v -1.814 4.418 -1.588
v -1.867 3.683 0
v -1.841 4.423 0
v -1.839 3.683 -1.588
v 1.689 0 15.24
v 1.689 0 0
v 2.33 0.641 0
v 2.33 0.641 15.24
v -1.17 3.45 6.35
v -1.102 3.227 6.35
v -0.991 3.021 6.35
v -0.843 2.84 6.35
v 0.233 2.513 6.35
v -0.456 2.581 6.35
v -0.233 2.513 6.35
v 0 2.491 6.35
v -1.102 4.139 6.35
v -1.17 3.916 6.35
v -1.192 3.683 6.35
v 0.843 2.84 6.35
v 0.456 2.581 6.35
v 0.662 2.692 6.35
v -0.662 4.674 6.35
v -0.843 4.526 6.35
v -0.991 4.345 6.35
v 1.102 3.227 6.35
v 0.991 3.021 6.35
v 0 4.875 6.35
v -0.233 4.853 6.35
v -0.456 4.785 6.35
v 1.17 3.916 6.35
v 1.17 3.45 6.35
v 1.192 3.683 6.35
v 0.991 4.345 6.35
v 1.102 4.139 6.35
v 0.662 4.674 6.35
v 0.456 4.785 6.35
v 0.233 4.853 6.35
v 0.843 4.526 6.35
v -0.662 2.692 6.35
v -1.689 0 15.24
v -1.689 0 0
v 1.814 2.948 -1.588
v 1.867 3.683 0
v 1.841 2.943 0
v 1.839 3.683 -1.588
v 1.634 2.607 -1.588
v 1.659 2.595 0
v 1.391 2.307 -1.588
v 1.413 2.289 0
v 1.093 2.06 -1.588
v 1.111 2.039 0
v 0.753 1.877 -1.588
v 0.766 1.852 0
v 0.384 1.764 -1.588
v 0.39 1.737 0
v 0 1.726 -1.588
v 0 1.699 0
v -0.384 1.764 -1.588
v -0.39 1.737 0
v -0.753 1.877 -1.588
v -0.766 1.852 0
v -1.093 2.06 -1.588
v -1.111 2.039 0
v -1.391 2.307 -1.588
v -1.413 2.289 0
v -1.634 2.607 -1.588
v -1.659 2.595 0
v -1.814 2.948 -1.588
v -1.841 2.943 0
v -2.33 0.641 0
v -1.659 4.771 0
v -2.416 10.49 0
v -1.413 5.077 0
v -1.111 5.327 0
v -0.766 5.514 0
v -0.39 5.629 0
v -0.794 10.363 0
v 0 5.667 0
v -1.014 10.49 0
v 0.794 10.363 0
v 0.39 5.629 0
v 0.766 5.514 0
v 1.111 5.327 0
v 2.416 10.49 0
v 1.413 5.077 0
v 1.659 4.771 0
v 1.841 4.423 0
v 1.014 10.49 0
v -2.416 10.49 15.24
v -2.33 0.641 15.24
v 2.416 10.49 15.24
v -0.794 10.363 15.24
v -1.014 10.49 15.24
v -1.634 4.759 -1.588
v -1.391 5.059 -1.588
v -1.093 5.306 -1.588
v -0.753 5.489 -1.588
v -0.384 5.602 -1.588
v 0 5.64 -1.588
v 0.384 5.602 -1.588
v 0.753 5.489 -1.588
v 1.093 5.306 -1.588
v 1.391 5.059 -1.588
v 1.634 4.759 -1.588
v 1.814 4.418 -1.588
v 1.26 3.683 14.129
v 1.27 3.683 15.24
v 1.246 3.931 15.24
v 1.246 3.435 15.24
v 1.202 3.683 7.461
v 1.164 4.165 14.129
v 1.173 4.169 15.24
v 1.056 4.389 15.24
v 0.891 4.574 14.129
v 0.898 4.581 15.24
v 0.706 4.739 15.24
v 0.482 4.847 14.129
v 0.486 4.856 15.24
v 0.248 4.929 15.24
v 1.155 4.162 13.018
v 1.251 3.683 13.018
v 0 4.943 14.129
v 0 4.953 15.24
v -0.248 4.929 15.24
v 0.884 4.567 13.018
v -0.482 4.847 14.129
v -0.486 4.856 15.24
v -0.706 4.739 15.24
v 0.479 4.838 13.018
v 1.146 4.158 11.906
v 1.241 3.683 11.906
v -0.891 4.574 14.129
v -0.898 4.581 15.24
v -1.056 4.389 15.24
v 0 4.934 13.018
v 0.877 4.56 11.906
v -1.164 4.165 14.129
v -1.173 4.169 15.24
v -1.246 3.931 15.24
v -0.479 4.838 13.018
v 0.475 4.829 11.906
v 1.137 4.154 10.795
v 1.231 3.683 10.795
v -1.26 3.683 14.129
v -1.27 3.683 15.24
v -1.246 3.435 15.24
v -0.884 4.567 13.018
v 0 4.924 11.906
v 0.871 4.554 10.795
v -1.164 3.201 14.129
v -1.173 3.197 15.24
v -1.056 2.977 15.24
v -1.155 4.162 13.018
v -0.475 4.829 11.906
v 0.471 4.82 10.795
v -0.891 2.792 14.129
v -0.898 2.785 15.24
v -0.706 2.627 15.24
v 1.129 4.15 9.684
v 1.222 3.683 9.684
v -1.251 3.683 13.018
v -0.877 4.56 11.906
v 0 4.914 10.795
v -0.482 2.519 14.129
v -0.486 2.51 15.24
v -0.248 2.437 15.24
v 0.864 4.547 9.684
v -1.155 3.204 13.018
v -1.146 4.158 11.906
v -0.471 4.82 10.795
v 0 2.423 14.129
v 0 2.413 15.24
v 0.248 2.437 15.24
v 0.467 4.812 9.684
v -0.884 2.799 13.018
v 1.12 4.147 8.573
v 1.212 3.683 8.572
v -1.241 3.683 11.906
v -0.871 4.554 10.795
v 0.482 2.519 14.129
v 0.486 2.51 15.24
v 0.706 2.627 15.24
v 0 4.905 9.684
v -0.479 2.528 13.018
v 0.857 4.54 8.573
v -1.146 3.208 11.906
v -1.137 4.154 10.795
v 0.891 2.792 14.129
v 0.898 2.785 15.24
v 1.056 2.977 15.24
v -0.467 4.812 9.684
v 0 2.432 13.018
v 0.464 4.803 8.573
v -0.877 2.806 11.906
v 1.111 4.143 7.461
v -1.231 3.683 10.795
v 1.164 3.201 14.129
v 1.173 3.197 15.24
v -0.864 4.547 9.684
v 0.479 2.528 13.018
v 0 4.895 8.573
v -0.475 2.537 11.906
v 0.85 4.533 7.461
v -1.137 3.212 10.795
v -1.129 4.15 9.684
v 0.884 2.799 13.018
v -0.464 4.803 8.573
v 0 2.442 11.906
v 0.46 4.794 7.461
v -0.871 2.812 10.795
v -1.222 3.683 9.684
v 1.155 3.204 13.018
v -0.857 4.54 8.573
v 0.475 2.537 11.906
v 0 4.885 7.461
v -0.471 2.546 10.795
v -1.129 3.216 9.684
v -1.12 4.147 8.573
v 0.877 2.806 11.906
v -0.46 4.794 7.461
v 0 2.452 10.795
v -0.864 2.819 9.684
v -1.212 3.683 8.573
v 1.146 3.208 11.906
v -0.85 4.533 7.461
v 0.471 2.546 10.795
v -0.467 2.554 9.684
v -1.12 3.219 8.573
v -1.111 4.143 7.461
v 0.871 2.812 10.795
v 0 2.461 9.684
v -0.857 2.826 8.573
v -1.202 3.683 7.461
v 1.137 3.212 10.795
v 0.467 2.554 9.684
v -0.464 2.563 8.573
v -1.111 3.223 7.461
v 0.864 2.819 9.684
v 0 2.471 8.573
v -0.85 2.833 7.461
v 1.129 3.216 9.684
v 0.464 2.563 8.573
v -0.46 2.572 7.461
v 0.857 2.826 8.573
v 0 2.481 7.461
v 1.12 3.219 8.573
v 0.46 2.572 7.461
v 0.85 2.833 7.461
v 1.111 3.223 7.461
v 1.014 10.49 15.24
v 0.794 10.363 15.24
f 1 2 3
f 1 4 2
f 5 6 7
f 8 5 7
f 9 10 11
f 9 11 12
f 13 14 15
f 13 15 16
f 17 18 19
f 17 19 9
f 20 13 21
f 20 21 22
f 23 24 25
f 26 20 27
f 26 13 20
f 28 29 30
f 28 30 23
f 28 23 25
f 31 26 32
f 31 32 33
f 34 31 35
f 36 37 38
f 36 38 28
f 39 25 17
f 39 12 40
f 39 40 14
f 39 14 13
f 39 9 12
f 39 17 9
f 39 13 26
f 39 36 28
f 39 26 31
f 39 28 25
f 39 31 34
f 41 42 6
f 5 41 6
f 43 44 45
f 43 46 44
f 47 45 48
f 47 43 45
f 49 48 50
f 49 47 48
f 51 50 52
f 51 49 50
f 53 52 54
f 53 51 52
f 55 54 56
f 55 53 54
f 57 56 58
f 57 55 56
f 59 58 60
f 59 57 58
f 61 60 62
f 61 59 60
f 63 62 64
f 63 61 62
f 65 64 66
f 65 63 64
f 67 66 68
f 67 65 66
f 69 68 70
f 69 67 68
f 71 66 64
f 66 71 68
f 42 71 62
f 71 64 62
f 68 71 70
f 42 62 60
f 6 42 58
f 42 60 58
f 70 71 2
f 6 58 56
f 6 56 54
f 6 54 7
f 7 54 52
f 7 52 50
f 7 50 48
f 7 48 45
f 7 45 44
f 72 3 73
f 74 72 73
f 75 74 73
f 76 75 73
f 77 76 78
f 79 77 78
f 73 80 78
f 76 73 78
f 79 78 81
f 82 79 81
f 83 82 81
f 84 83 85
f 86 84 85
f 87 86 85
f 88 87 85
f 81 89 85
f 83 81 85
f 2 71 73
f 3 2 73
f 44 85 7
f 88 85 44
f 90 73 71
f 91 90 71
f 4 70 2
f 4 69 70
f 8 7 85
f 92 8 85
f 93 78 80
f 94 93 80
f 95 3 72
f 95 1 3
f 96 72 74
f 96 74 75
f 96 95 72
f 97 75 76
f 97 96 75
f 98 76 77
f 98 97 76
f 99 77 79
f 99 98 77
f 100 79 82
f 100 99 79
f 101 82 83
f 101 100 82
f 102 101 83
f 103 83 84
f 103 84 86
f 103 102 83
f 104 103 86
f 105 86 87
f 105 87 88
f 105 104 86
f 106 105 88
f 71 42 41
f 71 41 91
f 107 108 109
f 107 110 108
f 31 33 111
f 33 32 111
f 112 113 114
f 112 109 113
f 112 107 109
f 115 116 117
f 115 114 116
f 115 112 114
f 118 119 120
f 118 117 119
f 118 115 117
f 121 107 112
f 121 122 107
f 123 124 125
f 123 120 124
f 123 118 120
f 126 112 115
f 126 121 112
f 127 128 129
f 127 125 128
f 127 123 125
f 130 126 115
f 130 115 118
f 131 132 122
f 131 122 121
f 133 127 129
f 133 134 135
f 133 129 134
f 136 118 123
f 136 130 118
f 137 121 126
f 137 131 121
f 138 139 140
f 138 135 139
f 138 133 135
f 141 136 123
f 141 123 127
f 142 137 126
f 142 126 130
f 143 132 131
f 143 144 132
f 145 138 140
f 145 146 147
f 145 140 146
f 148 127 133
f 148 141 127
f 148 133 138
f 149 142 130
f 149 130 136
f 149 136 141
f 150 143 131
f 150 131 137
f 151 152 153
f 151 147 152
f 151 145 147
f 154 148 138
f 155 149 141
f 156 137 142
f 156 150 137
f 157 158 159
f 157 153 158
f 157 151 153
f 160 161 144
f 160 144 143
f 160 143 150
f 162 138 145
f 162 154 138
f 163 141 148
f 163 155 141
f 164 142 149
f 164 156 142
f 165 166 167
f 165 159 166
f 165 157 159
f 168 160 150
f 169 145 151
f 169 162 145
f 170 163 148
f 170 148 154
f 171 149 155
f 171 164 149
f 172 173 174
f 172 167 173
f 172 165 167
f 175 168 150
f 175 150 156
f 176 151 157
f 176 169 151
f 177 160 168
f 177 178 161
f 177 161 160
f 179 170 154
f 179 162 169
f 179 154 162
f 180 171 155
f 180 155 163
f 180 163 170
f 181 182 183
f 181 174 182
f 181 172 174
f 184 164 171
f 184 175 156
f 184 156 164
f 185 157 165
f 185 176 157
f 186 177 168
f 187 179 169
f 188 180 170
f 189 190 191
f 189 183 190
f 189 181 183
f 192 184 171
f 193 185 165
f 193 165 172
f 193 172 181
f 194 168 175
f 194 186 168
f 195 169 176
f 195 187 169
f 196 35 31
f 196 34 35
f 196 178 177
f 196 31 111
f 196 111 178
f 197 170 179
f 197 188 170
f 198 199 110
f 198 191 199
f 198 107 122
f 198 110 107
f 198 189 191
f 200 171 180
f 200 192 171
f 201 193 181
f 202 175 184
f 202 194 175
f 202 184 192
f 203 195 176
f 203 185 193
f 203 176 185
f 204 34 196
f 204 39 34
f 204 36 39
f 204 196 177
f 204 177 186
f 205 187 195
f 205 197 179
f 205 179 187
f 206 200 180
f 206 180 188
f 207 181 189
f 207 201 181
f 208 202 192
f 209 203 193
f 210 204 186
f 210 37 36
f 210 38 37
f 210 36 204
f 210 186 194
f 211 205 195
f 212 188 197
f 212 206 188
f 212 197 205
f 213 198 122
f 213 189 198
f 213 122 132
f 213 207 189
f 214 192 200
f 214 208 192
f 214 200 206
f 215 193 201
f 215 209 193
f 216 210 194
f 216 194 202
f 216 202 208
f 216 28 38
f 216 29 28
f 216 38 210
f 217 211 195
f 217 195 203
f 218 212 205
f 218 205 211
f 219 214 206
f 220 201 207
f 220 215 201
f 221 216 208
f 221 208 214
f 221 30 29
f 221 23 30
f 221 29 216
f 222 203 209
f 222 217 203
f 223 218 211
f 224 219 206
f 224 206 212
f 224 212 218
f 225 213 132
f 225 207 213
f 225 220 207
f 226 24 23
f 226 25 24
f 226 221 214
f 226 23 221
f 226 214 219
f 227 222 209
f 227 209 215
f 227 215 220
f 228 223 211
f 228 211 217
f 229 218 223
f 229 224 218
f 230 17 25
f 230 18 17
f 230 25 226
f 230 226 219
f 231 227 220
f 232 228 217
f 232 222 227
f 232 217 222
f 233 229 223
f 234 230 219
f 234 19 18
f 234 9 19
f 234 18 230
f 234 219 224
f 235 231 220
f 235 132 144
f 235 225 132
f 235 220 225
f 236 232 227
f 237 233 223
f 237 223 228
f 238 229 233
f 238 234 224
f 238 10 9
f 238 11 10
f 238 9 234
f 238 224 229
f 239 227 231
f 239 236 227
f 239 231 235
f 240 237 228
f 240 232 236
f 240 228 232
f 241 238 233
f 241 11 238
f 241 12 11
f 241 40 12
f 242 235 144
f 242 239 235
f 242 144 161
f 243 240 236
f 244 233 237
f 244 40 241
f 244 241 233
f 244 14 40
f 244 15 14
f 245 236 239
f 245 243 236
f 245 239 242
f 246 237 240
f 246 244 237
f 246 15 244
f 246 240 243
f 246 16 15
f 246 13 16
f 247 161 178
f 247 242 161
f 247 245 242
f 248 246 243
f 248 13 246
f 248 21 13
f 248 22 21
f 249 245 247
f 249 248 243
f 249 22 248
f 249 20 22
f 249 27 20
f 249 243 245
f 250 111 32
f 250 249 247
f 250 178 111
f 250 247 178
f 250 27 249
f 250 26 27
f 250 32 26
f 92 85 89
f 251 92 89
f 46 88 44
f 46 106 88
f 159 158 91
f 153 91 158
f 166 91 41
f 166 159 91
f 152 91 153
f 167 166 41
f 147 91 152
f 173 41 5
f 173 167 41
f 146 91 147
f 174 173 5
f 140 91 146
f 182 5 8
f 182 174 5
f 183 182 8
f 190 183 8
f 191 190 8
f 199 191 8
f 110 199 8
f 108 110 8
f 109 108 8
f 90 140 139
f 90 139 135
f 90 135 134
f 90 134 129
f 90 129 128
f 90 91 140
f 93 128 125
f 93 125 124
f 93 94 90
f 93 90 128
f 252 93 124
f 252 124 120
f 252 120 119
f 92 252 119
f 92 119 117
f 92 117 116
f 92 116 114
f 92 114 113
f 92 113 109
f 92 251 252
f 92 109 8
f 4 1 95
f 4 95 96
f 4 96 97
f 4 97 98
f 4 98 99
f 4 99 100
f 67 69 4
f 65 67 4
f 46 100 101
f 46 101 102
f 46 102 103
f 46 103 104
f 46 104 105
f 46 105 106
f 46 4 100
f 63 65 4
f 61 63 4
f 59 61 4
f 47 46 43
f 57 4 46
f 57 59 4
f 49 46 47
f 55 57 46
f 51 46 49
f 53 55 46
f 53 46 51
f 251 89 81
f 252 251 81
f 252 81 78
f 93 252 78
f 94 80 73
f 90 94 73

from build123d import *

# Parameters (mm, degrees)
EXTRUDE1_DEPTH     = 15.24
EXTRUDE2_DEPTH     = 1.5875
EXTRUDE2_TAPER     = 1
SKETCH3_R          = 1.27
EXTRUDE3_DEPTH     = 8.89
EXTRUDE3_TAPER     = 0.5
EXTRUDE4_DEPTH     = 16.2400001
CUT_EXTRUDE1_DEPTH = 16.2400001


with BuildPart() as part:
    # Sketch1 → Extrude1 (new body)
    with BuildSketch(Plane.XY):
        Polygon((-2.3241, 0), (2.3241, 0), (2.415646588, 10.4902), (-2.415646588, 10.4902), align=None)
    extrude(amount=EXTRUDE1_DEPTH)

    # Sketch2 → Extrude2 (add)
    with BuildSketch(Plane(origin=(0, 0, 0), x_dir=(-1, 0, 0), z_dir=(0, 0, -1))):
        with BuildLine():
            Line((-1.841041911, 4.423478779), (-1.8669, 3.683))
            Line((-1.8669, 3.683), (-1.841041911, 2.942521221))
            ThreePointArc((-1.841041911, 2.942521221), (0, 1.698625), (1.841041911, 2.942521221))
            Line((1.841041911, 2.942521221), (1.8669, 3.683))
            Line((1.8669, 3.683), (1.841041911, 4.423478779))
            ThreePointArc((1.841041911, 4.423478779), (0, 5.667375), (-1.841041911, 4.423478779))
        make_face()
    extrude(amount=EXTRUDE2_DEPTH, taper=EXTRUDE2_TAPER)

    # Sketch3 → Extrude3 (cut)
    with BuildSketch(Plane.XY.offset(15.24)):
        with Locations((0, 3.683)):
            Circle(SKETCH3_R)
    extrude(amount=-EXTRUDE3_DEPTH, taper=EXTRUDE3_TAPER, mode=Mode.SUBTRACT)

    # Sketch4 → Extrude4 (cut, through all)
    with BuildSketch(Plane(origin=(0, 0, 0), x_dir=(-1, 0, 0), z_dir=(0, 0, -1))):
        Polygon((-1.013720453, 10.4902), (-0.79375, 10.3632), (0.79375, 10.3632), (1.013720453, 10.4902), align=None)
    extrude(amount=-EXTRUDE4_DEPTH, mode=Mode.SUBTRACT)

    # Sketch5 → Cut-Extrude1 (cut, through all)
    with BuildSketch(Plane(origin=(0, 0, 0), x_dir=(-1, 0, 0), z_dir=(0, 0, -1))):
        Polygon((-1.6891, 0), (-2.329690347, 0.640590347), (-2.3241, 0), align=None)
        Polygon((2.3241, 0), (1.6891, 0), (2.329690347, 0.640590347), align=None)
    extrude(amount=-CUT_EXTRUDE1_DEPTH, mode=Mode.SUBTRACT)


solid = part.part
